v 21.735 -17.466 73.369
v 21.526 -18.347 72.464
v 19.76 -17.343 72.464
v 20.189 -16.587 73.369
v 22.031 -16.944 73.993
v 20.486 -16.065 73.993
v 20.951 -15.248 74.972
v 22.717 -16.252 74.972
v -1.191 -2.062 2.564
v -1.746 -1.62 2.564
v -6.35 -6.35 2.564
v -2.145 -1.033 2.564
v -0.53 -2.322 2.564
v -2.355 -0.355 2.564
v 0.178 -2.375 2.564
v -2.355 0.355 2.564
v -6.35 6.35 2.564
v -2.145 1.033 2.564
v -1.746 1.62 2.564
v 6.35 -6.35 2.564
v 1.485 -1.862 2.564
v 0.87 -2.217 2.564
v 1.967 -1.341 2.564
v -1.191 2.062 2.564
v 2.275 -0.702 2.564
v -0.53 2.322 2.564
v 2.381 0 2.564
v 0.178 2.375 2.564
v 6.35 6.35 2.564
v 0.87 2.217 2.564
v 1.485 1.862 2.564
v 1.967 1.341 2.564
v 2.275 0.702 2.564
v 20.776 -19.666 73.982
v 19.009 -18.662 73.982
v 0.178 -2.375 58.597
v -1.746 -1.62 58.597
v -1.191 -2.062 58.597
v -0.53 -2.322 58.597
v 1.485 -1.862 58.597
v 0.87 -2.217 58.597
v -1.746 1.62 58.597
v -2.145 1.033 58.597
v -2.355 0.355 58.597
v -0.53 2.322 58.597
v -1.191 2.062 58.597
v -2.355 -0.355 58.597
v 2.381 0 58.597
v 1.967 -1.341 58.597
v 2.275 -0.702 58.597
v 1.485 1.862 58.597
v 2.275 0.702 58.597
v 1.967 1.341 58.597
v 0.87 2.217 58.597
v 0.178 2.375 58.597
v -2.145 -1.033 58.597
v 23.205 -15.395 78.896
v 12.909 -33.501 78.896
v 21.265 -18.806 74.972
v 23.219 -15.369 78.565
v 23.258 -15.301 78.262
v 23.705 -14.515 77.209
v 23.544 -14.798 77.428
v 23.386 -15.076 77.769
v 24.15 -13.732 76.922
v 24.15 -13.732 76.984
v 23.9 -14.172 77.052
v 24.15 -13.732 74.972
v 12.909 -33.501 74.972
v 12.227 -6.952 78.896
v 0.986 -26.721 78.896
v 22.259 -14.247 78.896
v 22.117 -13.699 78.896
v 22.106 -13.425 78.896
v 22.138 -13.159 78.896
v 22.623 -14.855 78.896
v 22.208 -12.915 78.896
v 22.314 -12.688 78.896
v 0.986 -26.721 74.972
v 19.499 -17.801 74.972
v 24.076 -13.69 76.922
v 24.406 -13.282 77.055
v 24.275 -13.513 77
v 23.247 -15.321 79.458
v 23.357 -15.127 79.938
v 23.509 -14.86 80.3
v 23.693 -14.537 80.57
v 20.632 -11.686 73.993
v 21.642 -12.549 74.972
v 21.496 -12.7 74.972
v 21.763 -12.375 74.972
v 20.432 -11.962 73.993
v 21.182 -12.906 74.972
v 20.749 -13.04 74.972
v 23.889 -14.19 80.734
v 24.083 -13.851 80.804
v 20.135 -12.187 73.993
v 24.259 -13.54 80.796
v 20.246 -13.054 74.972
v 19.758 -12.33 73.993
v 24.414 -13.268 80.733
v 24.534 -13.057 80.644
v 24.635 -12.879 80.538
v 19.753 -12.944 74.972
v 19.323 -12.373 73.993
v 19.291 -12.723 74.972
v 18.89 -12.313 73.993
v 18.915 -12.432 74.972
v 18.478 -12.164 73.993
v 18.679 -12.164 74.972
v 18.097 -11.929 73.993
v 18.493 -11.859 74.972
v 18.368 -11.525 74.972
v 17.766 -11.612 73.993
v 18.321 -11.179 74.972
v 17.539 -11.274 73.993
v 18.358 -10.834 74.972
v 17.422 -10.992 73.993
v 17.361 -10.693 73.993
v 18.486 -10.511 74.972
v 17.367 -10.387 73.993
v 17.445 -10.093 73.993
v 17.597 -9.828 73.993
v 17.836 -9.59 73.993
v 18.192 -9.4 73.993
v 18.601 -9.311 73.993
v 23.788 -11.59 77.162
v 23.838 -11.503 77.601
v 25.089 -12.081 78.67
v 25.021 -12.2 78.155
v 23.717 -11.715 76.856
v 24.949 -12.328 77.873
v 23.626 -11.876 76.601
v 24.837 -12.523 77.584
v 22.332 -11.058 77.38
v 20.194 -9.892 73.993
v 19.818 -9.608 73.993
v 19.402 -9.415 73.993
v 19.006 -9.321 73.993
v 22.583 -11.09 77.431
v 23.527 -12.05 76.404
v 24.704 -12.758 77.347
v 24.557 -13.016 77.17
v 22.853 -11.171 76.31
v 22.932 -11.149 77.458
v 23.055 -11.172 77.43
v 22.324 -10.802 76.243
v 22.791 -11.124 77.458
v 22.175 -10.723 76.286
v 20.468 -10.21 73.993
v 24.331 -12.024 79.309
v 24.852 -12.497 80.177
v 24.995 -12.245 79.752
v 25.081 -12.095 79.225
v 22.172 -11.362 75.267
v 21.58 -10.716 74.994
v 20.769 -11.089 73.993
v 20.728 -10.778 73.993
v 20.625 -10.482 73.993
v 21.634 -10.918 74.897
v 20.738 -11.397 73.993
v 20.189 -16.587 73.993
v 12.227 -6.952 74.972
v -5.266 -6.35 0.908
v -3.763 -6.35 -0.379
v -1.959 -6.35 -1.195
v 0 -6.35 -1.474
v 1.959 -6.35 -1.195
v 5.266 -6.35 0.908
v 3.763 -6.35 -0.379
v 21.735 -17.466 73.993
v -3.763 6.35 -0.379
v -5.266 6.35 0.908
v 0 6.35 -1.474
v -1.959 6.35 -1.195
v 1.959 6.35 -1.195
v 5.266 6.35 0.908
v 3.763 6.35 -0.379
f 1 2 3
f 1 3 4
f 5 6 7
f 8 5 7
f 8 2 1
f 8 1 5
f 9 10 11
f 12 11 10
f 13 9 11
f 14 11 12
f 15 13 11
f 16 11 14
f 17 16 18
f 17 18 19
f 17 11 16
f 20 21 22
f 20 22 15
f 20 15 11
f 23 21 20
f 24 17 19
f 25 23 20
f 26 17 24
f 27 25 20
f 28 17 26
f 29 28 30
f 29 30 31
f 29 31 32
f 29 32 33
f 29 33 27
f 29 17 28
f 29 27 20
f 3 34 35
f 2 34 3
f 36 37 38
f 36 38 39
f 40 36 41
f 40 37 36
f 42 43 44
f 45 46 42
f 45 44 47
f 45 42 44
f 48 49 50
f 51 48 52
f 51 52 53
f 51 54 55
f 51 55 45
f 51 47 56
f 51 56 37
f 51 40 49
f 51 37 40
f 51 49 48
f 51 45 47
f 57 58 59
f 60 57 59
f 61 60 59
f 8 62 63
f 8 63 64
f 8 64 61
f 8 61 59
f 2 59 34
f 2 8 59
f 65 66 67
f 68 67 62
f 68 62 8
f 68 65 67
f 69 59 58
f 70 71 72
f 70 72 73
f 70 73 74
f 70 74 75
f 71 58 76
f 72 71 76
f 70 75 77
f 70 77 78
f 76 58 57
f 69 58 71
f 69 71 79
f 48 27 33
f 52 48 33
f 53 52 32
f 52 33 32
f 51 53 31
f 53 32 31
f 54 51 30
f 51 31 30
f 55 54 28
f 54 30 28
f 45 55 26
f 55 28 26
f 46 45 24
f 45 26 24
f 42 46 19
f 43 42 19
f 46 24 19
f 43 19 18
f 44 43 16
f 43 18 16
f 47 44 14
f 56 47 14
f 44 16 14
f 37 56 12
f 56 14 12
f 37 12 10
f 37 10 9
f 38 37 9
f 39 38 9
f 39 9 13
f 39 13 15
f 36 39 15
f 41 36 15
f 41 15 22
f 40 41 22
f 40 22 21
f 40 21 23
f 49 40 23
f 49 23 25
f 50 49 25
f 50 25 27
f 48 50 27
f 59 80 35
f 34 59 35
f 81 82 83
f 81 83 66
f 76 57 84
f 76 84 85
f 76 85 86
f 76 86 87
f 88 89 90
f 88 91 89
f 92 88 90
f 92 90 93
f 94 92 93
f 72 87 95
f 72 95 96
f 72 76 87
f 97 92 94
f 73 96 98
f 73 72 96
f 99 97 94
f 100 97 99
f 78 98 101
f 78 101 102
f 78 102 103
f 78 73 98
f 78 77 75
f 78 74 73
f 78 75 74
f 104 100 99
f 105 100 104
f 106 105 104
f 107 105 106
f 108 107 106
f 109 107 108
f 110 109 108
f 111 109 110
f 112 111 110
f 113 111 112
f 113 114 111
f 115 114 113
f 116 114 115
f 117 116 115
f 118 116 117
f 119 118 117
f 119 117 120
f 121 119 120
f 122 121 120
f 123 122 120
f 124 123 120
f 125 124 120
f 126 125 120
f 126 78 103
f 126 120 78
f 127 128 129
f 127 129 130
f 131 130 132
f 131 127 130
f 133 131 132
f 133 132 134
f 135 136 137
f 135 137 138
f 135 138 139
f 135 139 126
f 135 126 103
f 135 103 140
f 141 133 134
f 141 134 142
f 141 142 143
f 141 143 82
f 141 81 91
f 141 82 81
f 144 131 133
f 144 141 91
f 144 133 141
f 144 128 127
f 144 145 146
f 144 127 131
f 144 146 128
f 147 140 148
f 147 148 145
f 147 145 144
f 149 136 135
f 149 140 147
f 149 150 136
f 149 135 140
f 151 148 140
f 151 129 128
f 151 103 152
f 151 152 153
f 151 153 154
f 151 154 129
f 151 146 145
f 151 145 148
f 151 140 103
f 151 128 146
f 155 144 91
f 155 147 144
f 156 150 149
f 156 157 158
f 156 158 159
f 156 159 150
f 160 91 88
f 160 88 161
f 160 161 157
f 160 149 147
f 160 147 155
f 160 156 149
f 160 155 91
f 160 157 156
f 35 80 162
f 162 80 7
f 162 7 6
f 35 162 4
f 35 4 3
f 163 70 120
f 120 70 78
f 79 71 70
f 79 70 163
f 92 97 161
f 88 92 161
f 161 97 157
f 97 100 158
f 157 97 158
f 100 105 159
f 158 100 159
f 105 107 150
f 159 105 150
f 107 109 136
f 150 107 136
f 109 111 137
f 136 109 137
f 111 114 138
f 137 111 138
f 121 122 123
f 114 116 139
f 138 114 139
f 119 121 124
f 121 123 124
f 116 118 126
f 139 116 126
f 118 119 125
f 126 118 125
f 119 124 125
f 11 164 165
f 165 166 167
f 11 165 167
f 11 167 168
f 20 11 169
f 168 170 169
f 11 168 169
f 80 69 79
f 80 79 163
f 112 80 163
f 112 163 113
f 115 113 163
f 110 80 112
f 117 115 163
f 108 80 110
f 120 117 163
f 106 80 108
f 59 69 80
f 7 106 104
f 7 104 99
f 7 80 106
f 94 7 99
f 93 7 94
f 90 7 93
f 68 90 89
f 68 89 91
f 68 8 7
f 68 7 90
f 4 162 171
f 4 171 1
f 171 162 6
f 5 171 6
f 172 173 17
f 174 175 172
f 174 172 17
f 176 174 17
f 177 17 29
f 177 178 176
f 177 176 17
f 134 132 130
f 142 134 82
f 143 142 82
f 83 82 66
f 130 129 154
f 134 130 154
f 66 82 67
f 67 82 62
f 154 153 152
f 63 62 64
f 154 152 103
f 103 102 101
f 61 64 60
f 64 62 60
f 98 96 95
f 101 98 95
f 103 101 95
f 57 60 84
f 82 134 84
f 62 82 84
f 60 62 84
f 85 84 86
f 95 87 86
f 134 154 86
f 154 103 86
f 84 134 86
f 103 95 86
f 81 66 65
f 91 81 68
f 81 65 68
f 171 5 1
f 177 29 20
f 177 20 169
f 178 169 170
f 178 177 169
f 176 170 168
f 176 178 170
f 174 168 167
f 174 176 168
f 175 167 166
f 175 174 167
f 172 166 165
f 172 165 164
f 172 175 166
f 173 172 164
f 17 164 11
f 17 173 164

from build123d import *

# Parameters (mm, degrees)
SKETCH1_R           = 2.38125
BOSS_EXTRUDE1_DEPTH = 58.596630013
BOSS_EXTRUDE2_DEPTH = 6.35
BOSS_EXTRUDE4_DEPTH = 2.032
SKETCH9_W           = 3.923830529
SKETCH9_H           = 22.741437235
BOSS_EXTRUDE5_DEPTH = 13.716
SKETCH10_W          = 30.955715765
SKETCH10_H          = 16.793936396
CUT_EXTRUDE1_DEPTH  = 25.146


with BuildPart() as part:
    # Sketch1 → Boss-Extrude1 (new body)
    with BuildSketch(Plane.XY):
        Circle(SKETCH1_R)
    extrude(amount=BOSS_EXTRUDE1_DEPTH)

    # Sketch2 → Boss-Extrude2 (add, symmetric)
    with BuildSketch(Plane(origin=(0, 0, 0), x_dir=(1, 0, 0), z_dir=(0, 1, 0))):
        with BuildLine():
            Line((-6.35, -2.563701192), (0, -2.563701192))
            Line((0, -2.563701192), (6.35, -2.563701192))
            ThreePointArc((6.35, -2.563701192), (0, 1.474189404), (-6.35, -2.563701192))
        make_face()
    extrude(amount=BOSS_EXTRUDE2_DEPTH, both=True)


with BuildPart() as body_2:
    # Loft1: read off the stored shape, not the designer's step
    # Loft1: loft between two sections, ruled curve by curve
    loft1_from = [
        Edge.make_bspline([(24.635403527, -12.878615764, 80.537548375), (24.703010916, -12.759717555, 80.455728817), (24.77457053, -12.633868737, 80.346542629), (24.911732936, -12.392647108, 80.047422189), (24.977401408, -12.277158789, 79.856219839), (25.072825843, -12.109339936, 79.38415277), (25.101598912, -12.058737976, 79.101944057), (25.087030549, -12.08435873, 78.502649545), (25.042262607, -12.163090185, 78.187958466), (24.880490774, -12.447591356, 77.640856383), (24.76460641, -12.651392206, 77.412231552), (24.510487992, -13.098299348, 77.102844403), (24.373971523, -13.338384995, 77.020671771), (24.123246128, -13.779324972, 76.96752084), (24.008916688, -13.980391244, 76.994154883), (23.813775258, -14.323578092, 77.097193937), (23.732379916, -14.466724581, 77.173116318), (23.597165139, -14.704520999, 77.336755435), (23.525605524, -14.830369818, 77.445941623), (23.388443119, -15.071591446, 77.745062063), (23.322774646, -15.187079766, 77.936264413), (23.227350212, -15.354898618, 78.408331482), (23.198577142, -15.405500579, 78.690540195), (23.213145506, -15.379879824, 79.289834707), (23.257913447, -15.30114837, 79.604525786), (23.41968528, -15.016647199, 80.151627869), (23.535569644, -14.812846348, 80.3802527), (23.789688063, -14.365939206, 80.689639849), (23.926204532, -14.125853559, 80.771812481), (24.176929926, -13.684913583, 80.824963412), (24.291259366, -13.483847311, 80.798329369), (24.486400797, -13.140660463, 80.695290315), (24.567796138, -12.997513973, 80.619367934), (24.635403527, -12.878615764, 80.537548375)], [0, 0, 0, 0, 0.0625, 0.0625, 0.125, 0.125, 0.1875, 0.1875, 0.25, 0.25, 0.3125, 0.3125, 0.375, 0.375, 0.4375, 0.4375, 0.5, 0.5, 0.5625, 0.5625, 0.625, 0.625, 0.6875, 0.6875, 0.75, 0.75, 0.8125, 0.8125, 0.875, 0.875, 0.9375, 0.9375, 1, 1, 1, 1], 3),
    ]
    loft1_to = [
        Edge.make_bspline([(2.767629763, 0.049839418, 56.82236264), (2.714463118, -0.043662476, 56.704750196), (2.64725177, -0.161864184, 56.584786377), (2.474918122, -0.464939965, 56.372841519), (2.369168557, -0.65091718, 56.28098433), (2.12144239, -1.086582543, 56.186412949), (1.979011826, -1.337069056, 56.185916163), (1.691706982, -1.842339737, 56.334845804), (1.548278172, -2.094581822, 56.486619954), (1.315737433, -2.503541227, 56.916862609), (1.228234782, -2.657428378, 57.192353655), (1.129312793, -2.83139823, 57.758013891), (1.116866397, -2.853287171, 58.045061216), (1.141353454, -2.810222836, 58.552665546), (1.177154765, -2.747260609, 58.773939726), (1.266145812, -2.590755879, 59.140083551), (1.319218682, -2.497418903, 59.286206124), (1.425551973, -2.310415115, 59.521431011), (1.49276332, -2.192213406, 59.64139483), (1.665096968, -1.889137626, 59.853339688), (1.770846533, -1.70316041, 59.945196877), (2.0185727, -1.267495047, 60.039768258), (2.161003265, -1.017008534, 60.040265044), (2.448308108, -0.511737853, 59.891335404), (2.591736918, -0.259495768, 59.739561253), (2.824277658, 0.149463636, 59.309318598), (2.911780308, 0.303350787, 59.033827552), (3.010702298, 0.477320639, 58.468167316), (3.023148693, 0.49920958, 58.181119991), (2.998661636, 0.456145246, 57.673515661), (2.962860325, 0.393183019, 57.452241481), (2.873869279, 0.236678289, 57.086097656), (2.820796408, 0.143341312, 56.939975083), (2.767629763, 0.049839418, 56.82236264)], [0, 0, 0, 0, 0.0625, 0.0625, 0.125, 0.125, 0.1875, 0.1875, 0.25, 0.25, 0.3125, 0.3125, 0.375, 0.375, 0.4375, 0.4375, 0.5, 0.5, 0.5625, 0.5625, 0.625, 0.625, 0.6875, 0.6875, 0.75, 0.75, 0.8125, 0.8125, 0.875, 0.875, 0.9375, 0.9375, 1, 1, 1, 1], 3),
    ]
    loft1 = Solid(Shell([*[Face.make_surface_from_curves(loft1_from[k], loft1_to[k]) for k in range(1)], Face(Wire(loft1_from)), Face(Wire(loft1_to))]))
    add(loft1)

    # Sketch8 → Boss-Extrude4 (add)
    with BuildSketch(Plane(origin=(24.150088027, -13.732119277, 0), x_dir=(0, 0, -1), z_dir=(0.869294507164732, -0.49429450716473244, 0))):
        Polygon((-78.75825642, -2.050545662), (-73.982171856, -6.826630226), (-72.464389408, -5.308847777), (-76.921993148, -1.025272831), (-76.921993148, 0), (-78.896242126, 0), (-78.896242126, -2.050545662), align=None)
    extrude(amount=-BOSS_EXTRUDE4_DEPTH)

    # Sketch9 → Boss-Extrude5 (add)
    with BuildSketch(Plane(origin=(24.150088027, -13.732119277, 0), x_dir=(0, 0, -1), z_dir=(0.869294507164732, -0.49429450716473244, 0))):
        with Locations((-76.934326862, -11.370718618)):
            Rectangle(SKETCH9_W, SKETCH9_H)
    extrude(amount=-BOSS_EXTRUDE5_DEPTH)

    # Sketch10 → Cut-Extrude1 (cut)
    with BuildSketch(Plane(origin=(2.070007545, -1.177038795, 0), x_dir=(0, 0, -1), z_dir=(0.8692945071647321, -0.49429450716473244, 0))):
        with Locations((-58.515492189, 3.957209781)):
            Rectangle(SKETCH10_W, SKETCH10_H)
    extrude(amount=CUT_EXTRUDE1_DEPTH, mode=Mode.SUBTRACT)


solid = Compound([part.part, body_2.part])
